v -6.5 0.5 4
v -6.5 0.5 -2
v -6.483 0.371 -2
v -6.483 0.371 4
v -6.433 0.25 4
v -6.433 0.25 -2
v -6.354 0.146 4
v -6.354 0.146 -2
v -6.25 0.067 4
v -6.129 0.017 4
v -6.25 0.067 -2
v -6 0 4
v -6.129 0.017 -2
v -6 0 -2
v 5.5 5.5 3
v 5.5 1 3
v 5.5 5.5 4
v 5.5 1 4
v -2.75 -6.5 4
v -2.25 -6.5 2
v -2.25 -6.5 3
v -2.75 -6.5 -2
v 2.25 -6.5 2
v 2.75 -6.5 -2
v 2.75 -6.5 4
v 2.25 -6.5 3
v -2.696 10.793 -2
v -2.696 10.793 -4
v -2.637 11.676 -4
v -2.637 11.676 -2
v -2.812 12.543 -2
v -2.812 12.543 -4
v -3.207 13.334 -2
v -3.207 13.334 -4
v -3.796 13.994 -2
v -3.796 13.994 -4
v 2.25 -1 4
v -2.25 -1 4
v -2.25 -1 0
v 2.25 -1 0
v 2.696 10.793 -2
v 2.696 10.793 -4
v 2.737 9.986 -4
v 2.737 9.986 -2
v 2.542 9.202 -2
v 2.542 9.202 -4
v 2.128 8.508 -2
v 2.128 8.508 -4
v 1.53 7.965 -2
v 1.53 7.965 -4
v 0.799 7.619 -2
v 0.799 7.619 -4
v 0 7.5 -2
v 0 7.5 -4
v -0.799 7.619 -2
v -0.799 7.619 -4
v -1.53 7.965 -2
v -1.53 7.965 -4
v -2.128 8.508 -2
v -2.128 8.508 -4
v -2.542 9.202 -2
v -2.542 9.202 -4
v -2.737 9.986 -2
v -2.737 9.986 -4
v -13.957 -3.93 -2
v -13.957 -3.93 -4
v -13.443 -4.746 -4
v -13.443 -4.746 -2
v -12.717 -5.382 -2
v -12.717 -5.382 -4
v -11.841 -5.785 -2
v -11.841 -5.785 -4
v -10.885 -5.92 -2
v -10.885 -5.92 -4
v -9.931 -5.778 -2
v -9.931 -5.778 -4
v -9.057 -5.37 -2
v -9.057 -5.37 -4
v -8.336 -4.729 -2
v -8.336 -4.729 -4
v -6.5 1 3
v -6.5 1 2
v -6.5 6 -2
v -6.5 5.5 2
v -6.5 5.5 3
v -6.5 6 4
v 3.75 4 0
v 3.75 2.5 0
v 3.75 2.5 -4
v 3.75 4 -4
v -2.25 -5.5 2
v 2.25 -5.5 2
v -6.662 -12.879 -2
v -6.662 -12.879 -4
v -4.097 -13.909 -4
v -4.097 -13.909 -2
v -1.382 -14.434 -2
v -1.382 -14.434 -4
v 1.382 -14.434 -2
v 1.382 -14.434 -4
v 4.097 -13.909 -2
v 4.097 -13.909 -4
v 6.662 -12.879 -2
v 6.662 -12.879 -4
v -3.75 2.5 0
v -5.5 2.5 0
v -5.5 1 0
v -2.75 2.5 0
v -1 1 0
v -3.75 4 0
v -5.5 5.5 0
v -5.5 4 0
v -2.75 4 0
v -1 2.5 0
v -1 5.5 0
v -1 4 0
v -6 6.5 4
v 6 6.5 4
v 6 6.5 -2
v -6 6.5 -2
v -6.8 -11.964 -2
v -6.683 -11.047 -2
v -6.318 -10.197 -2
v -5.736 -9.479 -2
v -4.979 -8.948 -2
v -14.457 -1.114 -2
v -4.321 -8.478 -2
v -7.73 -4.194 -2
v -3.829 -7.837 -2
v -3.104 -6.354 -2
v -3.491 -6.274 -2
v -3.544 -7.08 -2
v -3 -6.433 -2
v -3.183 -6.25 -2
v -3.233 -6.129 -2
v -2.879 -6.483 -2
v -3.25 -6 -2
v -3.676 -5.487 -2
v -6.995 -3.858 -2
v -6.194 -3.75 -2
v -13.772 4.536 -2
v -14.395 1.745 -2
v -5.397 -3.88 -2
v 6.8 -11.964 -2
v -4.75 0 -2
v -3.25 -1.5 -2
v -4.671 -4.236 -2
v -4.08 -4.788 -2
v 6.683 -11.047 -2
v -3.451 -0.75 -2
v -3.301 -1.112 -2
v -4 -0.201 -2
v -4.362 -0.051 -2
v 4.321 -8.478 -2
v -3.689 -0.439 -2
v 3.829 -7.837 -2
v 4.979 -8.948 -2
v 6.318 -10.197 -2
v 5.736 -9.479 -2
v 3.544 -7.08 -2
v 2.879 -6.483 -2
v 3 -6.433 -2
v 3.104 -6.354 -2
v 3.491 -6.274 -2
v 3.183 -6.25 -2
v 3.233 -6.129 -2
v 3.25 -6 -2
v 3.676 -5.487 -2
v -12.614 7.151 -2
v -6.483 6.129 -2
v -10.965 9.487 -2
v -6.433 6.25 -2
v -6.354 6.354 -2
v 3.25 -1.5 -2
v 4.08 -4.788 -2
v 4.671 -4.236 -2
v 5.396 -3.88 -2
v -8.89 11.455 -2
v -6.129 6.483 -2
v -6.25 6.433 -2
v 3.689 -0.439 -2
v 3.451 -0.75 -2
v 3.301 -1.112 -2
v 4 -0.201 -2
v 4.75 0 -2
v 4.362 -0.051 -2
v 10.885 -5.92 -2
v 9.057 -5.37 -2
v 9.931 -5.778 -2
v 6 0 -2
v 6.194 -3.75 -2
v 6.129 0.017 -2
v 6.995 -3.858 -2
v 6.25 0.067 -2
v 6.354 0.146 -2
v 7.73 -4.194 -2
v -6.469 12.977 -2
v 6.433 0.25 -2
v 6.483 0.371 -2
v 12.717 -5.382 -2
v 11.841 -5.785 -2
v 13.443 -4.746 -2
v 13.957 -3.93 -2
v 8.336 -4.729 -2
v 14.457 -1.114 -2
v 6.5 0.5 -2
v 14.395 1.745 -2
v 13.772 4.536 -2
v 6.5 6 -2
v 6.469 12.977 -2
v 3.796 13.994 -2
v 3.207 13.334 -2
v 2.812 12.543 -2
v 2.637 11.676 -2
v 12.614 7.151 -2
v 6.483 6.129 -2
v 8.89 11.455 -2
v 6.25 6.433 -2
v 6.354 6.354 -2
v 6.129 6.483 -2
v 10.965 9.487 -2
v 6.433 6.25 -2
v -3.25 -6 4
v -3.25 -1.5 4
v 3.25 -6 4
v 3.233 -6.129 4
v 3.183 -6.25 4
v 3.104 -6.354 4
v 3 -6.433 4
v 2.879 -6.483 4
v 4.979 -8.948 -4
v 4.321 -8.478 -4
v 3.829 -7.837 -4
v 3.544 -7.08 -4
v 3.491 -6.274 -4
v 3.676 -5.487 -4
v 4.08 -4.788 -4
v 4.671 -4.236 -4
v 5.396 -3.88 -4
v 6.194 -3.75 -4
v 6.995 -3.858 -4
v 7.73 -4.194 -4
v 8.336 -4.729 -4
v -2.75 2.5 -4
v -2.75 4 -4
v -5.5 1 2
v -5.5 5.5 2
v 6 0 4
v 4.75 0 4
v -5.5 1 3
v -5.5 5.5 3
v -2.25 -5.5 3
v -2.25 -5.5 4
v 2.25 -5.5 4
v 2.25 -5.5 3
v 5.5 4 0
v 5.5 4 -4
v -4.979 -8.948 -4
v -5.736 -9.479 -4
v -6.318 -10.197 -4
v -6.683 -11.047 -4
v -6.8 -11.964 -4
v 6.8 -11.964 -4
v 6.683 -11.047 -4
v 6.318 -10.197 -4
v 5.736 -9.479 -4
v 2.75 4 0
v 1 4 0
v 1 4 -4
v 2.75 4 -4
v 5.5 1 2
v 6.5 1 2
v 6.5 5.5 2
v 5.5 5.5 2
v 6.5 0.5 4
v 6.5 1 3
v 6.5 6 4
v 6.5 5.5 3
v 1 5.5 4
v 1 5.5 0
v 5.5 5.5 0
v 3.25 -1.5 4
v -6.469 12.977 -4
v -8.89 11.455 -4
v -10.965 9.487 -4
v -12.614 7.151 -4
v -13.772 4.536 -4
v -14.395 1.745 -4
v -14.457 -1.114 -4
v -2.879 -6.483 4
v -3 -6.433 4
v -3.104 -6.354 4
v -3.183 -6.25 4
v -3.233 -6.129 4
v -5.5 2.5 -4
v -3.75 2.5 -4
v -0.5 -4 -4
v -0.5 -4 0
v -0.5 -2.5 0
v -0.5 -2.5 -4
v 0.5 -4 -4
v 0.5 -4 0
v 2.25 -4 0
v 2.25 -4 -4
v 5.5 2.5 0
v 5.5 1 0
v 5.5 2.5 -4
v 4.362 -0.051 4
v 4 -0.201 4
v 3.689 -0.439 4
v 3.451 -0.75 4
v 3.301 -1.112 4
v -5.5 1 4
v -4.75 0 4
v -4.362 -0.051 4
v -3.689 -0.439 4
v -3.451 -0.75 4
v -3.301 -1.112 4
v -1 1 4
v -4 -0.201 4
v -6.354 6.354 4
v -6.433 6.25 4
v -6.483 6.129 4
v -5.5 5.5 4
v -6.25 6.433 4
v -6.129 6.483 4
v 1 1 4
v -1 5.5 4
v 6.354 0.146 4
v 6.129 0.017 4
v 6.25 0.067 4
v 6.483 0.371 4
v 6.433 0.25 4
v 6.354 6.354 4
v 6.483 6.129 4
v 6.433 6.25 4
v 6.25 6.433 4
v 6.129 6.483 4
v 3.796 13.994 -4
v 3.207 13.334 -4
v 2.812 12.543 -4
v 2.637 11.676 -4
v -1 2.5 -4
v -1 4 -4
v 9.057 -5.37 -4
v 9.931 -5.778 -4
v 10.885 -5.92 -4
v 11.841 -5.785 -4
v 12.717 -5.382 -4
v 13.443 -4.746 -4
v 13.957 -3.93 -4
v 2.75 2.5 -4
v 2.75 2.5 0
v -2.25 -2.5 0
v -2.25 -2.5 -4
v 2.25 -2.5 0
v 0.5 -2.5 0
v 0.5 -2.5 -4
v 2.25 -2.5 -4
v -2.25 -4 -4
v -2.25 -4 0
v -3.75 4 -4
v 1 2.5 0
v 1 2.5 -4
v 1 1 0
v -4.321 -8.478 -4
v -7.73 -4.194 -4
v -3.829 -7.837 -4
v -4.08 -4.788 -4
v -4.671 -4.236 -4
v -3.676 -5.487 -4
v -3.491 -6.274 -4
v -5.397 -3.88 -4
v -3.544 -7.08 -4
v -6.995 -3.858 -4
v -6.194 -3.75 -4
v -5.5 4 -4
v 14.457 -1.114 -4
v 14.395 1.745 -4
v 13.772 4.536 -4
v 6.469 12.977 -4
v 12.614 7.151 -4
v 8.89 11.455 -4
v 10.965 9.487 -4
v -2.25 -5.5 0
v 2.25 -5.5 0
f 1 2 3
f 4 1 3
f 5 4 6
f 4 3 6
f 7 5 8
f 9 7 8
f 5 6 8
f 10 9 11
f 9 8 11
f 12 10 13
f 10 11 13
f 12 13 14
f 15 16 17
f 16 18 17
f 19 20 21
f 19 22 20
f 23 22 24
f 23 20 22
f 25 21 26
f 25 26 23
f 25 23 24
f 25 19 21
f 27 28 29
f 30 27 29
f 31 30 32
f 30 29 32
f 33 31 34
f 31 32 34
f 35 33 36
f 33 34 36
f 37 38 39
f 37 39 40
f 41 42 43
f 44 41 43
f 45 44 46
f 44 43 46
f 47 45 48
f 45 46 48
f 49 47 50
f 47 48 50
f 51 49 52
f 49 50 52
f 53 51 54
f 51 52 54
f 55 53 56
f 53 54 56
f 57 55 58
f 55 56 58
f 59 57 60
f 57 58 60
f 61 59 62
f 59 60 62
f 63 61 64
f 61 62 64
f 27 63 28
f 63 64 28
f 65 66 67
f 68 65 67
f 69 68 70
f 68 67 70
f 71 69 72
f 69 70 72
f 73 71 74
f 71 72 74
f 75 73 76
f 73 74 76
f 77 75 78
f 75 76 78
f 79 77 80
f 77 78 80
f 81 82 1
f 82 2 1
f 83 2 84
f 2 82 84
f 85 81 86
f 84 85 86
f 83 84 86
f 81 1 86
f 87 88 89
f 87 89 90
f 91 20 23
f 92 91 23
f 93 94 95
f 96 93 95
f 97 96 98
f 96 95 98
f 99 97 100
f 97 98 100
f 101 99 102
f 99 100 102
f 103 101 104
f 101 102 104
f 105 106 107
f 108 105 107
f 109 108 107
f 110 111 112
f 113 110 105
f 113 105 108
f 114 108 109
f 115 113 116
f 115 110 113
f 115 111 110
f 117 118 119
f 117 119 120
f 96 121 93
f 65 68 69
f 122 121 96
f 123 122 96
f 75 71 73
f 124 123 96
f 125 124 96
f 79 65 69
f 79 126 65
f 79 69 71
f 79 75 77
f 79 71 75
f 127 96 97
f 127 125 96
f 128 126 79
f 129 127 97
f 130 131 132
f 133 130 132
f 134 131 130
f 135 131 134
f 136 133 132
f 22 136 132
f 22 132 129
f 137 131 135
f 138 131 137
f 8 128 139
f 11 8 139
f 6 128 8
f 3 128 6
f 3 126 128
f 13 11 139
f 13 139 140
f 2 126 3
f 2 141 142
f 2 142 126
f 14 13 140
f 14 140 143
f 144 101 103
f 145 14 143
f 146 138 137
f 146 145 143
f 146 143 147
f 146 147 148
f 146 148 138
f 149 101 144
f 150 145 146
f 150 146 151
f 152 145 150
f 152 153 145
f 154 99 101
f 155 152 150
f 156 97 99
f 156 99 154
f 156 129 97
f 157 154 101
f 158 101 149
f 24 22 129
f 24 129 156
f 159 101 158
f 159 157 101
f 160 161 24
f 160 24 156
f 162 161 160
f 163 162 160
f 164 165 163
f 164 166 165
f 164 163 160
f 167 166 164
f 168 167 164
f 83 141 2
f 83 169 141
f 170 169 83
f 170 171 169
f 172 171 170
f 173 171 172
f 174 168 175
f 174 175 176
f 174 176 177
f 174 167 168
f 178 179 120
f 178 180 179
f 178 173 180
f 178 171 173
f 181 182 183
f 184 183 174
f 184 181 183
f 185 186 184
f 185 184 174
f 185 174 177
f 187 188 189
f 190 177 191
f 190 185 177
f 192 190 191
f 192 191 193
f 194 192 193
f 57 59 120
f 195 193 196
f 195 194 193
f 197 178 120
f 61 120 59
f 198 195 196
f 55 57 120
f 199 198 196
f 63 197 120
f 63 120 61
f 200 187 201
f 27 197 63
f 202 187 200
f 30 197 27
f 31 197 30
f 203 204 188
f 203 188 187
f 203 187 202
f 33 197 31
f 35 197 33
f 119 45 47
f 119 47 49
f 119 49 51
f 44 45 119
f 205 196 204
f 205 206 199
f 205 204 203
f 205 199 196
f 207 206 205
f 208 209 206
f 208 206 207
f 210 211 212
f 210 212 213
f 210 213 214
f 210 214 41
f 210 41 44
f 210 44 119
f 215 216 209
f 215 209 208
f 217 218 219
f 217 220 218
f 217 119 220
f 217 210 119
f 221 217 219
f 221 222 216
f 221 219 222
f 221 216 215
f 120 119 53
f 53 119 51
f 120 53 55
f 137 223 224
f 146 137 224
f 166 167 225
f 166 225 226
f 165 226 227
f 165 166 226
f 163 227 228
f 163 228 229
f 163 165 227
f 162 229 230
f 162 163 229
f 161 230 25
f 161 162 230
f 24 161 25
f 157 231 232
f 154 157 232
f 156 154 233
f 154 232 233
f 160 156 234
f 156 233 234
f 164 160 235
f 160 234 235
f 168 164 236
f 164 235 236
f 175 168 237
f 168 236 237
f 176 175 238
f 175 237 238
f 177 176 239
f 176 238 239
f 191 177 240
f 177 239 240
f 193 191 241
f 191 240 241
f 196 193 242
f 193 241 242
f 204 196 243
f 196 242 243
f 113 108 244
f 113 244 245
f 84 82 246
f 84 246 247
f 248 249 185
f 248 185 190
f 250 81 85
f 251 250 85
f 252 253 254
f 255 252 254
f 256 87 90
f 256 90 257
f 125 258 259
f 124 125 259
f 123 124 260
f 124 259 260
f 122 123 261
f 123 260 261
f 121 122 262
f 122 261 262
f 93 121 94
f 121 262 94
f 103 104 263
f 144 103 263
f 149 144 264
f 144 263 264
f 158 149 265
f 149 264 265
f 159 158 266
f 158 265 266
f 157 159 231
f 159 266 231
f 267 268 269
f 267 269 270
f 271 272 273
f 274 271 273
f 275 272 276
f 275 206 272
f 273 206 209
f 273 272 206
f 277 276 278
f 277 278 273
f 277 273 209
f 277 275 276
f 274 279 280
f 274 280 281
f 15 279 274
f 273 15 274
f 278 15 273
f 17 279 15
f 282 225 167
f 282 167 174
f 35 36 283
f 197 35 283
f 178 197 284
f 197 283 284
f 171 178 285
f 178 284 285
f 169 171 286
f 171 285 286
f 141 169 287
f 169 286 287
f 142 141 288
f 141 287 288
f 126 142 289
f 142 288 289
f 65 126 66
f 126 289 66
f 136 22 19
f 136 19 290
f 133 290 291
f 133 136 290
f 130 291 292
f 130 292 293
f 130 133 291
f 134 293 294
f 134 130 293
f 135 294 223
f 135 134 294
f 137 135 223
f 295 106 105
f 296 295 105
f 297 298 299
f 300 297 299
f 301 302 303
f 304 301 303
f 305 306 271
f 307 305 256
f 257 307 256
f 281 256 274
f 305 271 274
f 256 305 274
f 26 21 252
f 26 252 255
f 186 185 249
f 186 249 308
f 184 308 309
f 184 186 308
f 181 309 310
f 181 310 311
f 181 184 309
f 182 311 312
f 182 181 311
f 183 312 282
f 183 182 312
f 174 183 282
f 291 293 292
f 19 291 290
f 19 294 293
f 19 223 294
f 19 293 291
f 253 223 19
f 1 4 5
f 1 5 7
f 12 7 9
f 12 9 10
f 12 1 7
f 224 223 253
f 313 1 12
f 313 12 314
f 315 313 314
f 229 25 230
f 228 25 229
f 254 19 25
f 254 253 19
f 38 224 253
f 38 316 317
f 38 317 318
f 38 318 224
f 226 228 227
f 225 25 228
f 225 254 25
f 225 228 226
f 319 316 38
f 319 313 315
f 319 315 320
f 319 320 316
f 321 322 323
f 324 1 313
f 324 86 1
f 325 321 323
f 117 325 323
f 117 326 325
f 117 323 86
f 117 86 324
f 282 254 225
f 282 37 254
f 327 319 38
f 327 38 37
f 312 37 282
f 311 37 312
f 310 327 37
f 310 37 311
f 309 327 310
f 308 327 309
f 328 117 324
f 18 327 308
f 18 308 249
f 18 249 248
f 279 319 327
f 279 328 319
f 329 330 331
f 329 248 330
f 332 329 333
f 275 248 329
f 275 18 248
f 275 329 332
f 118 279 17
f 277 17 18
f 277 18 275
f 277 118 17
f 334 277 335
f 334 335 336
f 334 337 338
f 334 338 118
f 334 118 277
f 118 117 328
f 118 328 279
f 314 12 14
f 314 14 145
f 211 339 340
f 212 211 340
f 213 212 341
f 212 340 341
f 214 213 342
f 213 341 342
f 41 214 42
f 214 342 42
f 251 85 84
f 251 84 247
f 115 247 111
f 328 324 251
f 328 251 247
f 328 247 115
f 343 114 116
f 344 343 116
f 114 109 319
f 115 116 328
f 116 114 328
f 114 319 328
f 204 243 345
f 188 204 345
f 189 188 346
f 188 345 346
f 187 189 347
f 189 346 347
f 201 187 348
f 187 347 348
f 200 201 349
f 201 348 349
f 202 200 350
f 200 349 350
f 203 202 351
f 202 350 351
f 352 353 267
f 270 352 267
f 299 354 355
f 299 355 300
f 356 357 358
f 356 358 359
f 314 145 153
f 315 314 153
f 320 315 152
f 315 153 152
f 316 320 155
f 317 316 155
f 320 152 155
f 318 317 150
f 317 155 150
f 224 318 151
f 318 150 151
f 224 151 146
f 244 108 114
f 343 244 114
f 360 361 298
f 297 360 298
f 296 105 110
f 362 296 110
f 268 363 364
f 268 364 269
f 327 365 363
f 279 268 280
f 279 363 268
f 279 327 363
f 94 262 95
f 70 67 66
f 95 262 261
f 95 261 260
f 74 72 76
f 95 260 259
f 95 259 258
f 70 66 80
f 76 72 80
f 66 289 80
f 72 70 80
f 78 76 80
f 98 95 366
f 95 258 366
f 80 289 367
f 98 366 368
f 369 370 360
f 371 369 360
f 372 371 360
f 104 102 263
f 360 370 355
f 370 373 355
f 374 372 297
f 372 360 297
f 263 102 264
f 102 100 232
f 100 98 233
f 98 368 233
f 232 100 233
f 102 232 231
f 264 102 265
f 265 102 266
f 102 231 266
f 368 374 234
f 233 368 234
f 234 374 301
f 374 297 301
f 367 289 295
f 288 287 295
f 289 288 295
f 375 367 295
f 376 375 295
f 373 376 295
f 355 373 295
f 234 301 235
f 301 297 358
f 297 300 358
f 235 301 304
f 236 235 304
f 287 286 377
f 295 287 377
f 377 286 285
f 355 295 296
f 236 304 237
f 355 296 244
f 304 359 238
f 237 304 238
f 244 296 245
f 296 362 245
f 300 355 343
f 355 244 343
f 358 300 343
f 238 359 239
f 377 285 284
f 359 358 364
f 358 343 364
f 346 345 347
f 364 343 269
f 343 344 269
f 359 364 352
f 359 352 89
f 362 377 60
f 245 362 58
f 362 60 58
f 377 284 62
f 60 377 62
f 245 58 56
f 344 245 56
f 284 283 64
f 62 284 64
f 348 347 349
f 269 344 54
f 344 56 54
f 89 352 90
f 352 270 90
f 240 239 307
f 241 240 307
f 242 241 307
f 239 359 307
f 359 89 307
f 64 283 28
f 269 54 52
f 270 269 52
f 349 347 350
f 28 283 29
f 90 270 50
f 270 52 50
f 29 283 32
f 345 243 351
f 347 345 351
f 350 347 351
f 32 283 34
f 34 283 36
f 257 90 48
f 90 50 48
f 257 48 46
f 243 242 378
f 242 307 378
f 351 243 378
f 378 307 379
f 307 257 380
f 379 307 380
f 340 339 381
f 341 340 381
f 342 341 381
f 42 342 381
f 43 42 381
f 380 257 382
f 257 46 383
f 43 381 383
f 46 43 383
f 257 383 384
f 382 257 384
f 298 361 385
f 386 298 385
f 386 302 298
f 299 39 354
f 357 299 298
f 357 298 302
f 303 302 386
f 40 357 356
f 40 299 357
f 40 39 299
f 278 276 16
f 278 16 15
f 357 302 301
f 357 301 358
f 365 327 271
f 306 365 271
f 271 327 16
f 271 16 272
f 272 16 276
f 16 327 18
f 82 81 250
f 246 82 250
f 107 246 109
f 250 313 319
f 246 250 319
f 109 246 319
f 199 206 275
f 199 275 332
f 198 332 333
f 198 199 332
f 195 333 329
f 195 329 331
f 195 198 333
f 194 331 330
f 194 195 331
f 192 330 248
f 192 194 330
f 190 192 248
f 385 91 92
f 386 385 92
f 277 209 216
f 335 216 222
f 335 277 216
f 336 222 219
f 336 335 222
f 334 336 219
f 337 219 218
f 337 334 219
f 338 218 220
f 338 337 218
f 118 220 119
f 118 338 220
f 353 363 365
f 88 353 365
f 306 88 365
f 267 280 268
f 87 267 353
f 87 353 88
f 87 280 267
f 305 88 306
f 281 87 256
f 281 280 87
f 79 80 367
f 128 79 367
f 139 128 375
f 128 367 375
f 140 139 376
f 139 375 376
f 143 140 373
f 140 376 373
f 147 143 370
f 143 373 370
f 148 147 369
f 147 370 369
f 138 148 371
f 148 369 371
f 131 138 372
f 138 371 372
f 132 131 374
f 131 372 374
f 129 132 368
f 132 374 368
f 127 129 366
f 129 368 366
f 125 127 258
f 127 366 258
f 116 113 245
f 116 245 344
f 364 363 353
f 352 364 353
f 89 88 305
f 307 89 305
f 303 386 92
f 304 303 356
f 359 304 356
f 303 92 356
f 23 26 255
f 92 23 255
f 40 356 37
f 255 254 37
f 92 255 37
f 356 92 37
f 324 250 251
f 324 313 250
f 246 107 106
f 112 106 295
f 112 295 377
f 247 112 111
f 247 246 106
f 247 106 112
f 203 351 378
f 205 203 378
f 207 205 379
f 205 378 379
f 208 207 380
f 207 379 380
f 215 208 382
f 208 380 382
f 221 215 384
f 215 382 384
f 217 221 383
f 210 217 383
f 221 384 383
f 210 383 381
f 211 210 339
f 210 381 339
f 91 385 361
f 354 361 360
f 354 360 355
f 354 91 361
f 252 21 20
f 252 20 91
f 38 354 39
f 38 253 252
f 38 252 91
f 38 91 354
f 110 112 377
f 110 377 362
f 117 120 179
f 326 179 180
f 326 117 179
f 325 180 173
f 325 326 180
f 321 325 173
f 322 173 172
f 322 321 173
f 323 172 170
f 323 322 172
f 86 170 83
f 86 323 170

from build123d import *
from OCP.BRepFilletAPI import BRepFilletAPI_MakeFillet

# Parameters (mm, degrees)
SKETCH1_W           = 6.5
SKETCH1_H           = 6.5
BOSS_EXTRUDE1_DEPTH = 4
SKETCH5_W           = 6.5
SKETCH5_H           = 6.5
BOSS_EXTRUDE2_DEPTH = 8
SKETCH2_W           = 4.5
SKETCH2_H           = 4.5
CUT_EXTRUDE1_DEPTH  = 4
SKETCH10_W          = 1.75
SKETCH10_H          = 1.5
CUT_EXTRUDE3_DEPTH  = 11.024968828
FILLET7_R1          = 0.5
FILLET7_R2          = 1.5
BOSS_EXTRUDE3_DEPTH = 2
SKETCH12_W          = 1
SKETCH12_H          = 4.5
CUT_EXTRUDE4_DEPTH  = 5.5
SKETCH14_W          = 1
SKETCH14_H          = 4.5
CUT_EXTRUDE5_DEPTH  = 5.5
SKETCH15_W          = 4.5
SKETCH15_H          = 1
CUT_EXTRUDE6_DEPTH  = 5.5


with BuildPart() as part:
    # Sketch1 → Boss-Extrude1 (new, symmetric)
    with BuildSketch(Plane.XY):
        with Locations((3.25, 3.25)):
            Rectangle(SKETCH1_W, SKETCH1_H)
        with Locations((-3.25, 3.25)):
            Rectangle(SKETCH1_W, SKETCH1_H)
    extrude(amount=BOSS_EXTRUDE1_DEPTH, both=True)

    # Sketch5 → Boss-Extrude2 (add)
    with BuildSketch(Plane.XY.offset(4)):
        with Locations((0, -3.25)):
            Rectangle(SKETCH5_W, SKETCH5_H)
    extrude(amount=-BOSS_EXTRUDE2_DEPTH)

    # Sketch2 → Cut-Extrude1 (cut)
    with BuildSketch(Plane.XY.offset(4)):
        with Locations((3.25, 3.25)):
            Rectangle(SKETCH2_W, SKETCH2_H)
        with Locations((-3.25, 3.25)):
            Rectangle(SKETCH2_W, SKETCH2_H)
        with Locations((0, -3.25)):
            Rectangle(SKETCH2_W, SKETCH2_H)
    extrude(amount=-CUT_EXTRUDE1_DEPTH, mode=Mode.SUBTRACT)

    # Sketch10 → Cut-Extrude3 (cut, through all)
    with BuildSketch(Plane.XY):
        with Locations((1.875, 3.25)):
            Rectangle(SKETCH10_W, SKETCH10_H)
        with Locations((-4.625, 3.25)):
            Rectangle(SKETCH10_W, SKETCH10_H)
        with Locations((4.625, 3.25)):
            Rectangle(SKETCH10_W, SKETCH10_H)
        with Locations((-1.875, 3.25)):
            Rectangle(SKETCH10_W, SKETCH10_H)
        with Locations((-1.375, -3.25)):
            Rectangle(SKETCH10_W, SKETCH10_H)
        with Locations((1.375, -3.25)):
            Rectangle(SKETCH10_W, SKETCH10_H)
    extrude(amount=-CUT_EXTRUDE3_DEPTH, mode=Mode.SUBTRACT)

    # Fillet7: one fillet with a radius per group of edges: ONE call of the kernel's fillet builder (fillet() takes one radius for all edges)
    fillet7_edges_1 = [part.edges().sort_by_distance(p)[0] for p in [
        (-6.5, 0, 0),
        (-6.5, 6.5, 0),
        (6.5, 6.5, 0),
        (6.5, 0, 0),
        (-3.25, -6.5, 0),
        (3.25, -6.5, 0),
    ]]
    fillet7_edges_2 = [part.edges().sort_by_distance(p)[0] for p in [
        (-3.25, 0, 0),
        (3.25, 0, 0),
    ]]
    fillet7 = BRepFilletAPI_MakeFillet(part.part.solid().wrapped)
    for e in fillet7_edges_1:
        fillet7.Add(FILLET7_R1, e.wrapped)
    for e in fillet7_edges_2:
        fillet7.Add(FILLET7_R2, e.wrapped)
    add(Compound.cast(fillet7.Shape()), mode=Mode.REPLACE)

    # Sketch11 → Boss-Extrude3 (add)
    with BuildSketch(Plane.XY.offset(-4)):
        with BuildLine():
            ThreePointArc((-6.662391677, -12.878763029), (1.7135e-05, -14.5), (6.662422116, -12.878747282))
            ThreePointArc((6.662422116, -12.878747282), (6.529952292, -10.609320257), (4.978591095, -8.947656719))
            ThreePointArc((4.978591095, -8.947656719), (4.08034863, -4.787651774), (8.335817539, -4.728787212))
            ThreePointArc((8.335817539, -4.728787212), (11.36788446, -5.887108435), (13.95725976, -3.93))
            ThreePointArc((13.95725976, -3.93), (12.614166243, 7.150720942), (3.796390173, 13.994192426))
            ThreePointArc((3.796390173, 13.994192426), (2.811770094, 12.543018162), (2.695822199, 10.793178304))
            ThreePointArc((2.695822199, 10.793178304), (0, 7.5), (-2.695822199, 10.793178304))
            ThreePointArc((-2.695822199, 10.793178304), (-2.811770094, 12.543018162), (-3.796390173, 13.994192426))
            ThreePointArc((-3.796390173, 13.994192426), (-12.614205329, 7.150651992), (-13.957216796, -3.930152581))
            ThreePointArc((-13.957216796, -3.930152581), (-11.367821604, -5.887138898), (-8.335824842, -4.728795885))
            ThreePointArc((-8.335824842, -4.728795885), (-4.08035569, -4.787642902), (-4.978581003, -8.947651551))
            ThreePointArc((-4.978581003, -8.947651551), (-6.529938219, -10.609328183), (-6.662391677, -12.878763029))
        make_face()
        with BuildLine():
            Line((-3.25, -1.5), (-3.25, -6))
            ThreePointArc((-3.25, -6), (-3.103553391, -6.353553391), (-2.75, -6.5))
            Line((-2.75, -6.5), (2.75, -6.5))
            ThreePointArc((2.75, -6.5), (3.103553391, -6.353553391), (3.25, -6))
            Line((3.25, -6), (3.25, -1.5))
            ThreePointArc((3.25, -1.5), (3.689339828, -0.439339828), (4.75, 0))
            Line((4.75, 0), (6, 0))
            ThreePointArc((6, 0), (6.353553391, 0.146446609), (6.5, 0.5))
            Line((6.5, 0.5), (6.5, 6))
            ThreePointArc((6.5, 6), (6.353553391, 6.353553391), (6, 6.5))
            Line((6, 6.5), (-6, 6.5))
            ThreePointArc((-6, 6.5), (-6.353553391, 6.353553391), (-6.5, 6))
            Line((-6.5, 6), (-6.5, 0.5))
            ThreePointArc((-6.5, 0.5), (-6.353553391, 0.146446609), (-6, 0))
            Line((-6, 0), (-4.75, 0))
            ThreePointArc((-4.75, 0), (-3.689339828, -0.439339828), (-3.25, -1.5))
        make_face(mode=Mode.SUBTRACT)
    extrude(amount=BOSS_EXTRUDE3_DEPTH)

    # Sketch12 → Cut-Extrude4 (cut)
    with BuildSketch(Plane.ZY.offset(6.5)):
        with Locations((2.5, 3.25)):
            Rectangle(SKETCH12_W, SKETCH12_H)
    extrude(amount=-CUT_EXTRUDE4_DEPTH, mode=Mode.SUBTRACT)

    # Sketch14 → Cut-Extrude5 (cut)
    with BuildSketch(Plane(origin=(6.5, 0, 0), x_dir=(0, 0, -1), z_dir=(1, 0, 0))):
        with Locations((-2.5, 3.25)):
            Rectangle(SKETCH14_W, SKETCH14_H)
    extrude(amount=-CUT_EXTRUDE5_DEPTH, mode=Mode.SUBTRACT)

    # Sketch15 → Cut-Extrude6 (cut)
    with BuildSketch(Plane.XZ.offset(6.5)):
        with Locations((0, 2.5)):
            Rectangle(SKETCH15_W, SKETCH15_H)
    extrude(amount=-CUT_EXTRUDE6_DEPTH, mode=Mode.SUBTRACT)


solid = part.part
